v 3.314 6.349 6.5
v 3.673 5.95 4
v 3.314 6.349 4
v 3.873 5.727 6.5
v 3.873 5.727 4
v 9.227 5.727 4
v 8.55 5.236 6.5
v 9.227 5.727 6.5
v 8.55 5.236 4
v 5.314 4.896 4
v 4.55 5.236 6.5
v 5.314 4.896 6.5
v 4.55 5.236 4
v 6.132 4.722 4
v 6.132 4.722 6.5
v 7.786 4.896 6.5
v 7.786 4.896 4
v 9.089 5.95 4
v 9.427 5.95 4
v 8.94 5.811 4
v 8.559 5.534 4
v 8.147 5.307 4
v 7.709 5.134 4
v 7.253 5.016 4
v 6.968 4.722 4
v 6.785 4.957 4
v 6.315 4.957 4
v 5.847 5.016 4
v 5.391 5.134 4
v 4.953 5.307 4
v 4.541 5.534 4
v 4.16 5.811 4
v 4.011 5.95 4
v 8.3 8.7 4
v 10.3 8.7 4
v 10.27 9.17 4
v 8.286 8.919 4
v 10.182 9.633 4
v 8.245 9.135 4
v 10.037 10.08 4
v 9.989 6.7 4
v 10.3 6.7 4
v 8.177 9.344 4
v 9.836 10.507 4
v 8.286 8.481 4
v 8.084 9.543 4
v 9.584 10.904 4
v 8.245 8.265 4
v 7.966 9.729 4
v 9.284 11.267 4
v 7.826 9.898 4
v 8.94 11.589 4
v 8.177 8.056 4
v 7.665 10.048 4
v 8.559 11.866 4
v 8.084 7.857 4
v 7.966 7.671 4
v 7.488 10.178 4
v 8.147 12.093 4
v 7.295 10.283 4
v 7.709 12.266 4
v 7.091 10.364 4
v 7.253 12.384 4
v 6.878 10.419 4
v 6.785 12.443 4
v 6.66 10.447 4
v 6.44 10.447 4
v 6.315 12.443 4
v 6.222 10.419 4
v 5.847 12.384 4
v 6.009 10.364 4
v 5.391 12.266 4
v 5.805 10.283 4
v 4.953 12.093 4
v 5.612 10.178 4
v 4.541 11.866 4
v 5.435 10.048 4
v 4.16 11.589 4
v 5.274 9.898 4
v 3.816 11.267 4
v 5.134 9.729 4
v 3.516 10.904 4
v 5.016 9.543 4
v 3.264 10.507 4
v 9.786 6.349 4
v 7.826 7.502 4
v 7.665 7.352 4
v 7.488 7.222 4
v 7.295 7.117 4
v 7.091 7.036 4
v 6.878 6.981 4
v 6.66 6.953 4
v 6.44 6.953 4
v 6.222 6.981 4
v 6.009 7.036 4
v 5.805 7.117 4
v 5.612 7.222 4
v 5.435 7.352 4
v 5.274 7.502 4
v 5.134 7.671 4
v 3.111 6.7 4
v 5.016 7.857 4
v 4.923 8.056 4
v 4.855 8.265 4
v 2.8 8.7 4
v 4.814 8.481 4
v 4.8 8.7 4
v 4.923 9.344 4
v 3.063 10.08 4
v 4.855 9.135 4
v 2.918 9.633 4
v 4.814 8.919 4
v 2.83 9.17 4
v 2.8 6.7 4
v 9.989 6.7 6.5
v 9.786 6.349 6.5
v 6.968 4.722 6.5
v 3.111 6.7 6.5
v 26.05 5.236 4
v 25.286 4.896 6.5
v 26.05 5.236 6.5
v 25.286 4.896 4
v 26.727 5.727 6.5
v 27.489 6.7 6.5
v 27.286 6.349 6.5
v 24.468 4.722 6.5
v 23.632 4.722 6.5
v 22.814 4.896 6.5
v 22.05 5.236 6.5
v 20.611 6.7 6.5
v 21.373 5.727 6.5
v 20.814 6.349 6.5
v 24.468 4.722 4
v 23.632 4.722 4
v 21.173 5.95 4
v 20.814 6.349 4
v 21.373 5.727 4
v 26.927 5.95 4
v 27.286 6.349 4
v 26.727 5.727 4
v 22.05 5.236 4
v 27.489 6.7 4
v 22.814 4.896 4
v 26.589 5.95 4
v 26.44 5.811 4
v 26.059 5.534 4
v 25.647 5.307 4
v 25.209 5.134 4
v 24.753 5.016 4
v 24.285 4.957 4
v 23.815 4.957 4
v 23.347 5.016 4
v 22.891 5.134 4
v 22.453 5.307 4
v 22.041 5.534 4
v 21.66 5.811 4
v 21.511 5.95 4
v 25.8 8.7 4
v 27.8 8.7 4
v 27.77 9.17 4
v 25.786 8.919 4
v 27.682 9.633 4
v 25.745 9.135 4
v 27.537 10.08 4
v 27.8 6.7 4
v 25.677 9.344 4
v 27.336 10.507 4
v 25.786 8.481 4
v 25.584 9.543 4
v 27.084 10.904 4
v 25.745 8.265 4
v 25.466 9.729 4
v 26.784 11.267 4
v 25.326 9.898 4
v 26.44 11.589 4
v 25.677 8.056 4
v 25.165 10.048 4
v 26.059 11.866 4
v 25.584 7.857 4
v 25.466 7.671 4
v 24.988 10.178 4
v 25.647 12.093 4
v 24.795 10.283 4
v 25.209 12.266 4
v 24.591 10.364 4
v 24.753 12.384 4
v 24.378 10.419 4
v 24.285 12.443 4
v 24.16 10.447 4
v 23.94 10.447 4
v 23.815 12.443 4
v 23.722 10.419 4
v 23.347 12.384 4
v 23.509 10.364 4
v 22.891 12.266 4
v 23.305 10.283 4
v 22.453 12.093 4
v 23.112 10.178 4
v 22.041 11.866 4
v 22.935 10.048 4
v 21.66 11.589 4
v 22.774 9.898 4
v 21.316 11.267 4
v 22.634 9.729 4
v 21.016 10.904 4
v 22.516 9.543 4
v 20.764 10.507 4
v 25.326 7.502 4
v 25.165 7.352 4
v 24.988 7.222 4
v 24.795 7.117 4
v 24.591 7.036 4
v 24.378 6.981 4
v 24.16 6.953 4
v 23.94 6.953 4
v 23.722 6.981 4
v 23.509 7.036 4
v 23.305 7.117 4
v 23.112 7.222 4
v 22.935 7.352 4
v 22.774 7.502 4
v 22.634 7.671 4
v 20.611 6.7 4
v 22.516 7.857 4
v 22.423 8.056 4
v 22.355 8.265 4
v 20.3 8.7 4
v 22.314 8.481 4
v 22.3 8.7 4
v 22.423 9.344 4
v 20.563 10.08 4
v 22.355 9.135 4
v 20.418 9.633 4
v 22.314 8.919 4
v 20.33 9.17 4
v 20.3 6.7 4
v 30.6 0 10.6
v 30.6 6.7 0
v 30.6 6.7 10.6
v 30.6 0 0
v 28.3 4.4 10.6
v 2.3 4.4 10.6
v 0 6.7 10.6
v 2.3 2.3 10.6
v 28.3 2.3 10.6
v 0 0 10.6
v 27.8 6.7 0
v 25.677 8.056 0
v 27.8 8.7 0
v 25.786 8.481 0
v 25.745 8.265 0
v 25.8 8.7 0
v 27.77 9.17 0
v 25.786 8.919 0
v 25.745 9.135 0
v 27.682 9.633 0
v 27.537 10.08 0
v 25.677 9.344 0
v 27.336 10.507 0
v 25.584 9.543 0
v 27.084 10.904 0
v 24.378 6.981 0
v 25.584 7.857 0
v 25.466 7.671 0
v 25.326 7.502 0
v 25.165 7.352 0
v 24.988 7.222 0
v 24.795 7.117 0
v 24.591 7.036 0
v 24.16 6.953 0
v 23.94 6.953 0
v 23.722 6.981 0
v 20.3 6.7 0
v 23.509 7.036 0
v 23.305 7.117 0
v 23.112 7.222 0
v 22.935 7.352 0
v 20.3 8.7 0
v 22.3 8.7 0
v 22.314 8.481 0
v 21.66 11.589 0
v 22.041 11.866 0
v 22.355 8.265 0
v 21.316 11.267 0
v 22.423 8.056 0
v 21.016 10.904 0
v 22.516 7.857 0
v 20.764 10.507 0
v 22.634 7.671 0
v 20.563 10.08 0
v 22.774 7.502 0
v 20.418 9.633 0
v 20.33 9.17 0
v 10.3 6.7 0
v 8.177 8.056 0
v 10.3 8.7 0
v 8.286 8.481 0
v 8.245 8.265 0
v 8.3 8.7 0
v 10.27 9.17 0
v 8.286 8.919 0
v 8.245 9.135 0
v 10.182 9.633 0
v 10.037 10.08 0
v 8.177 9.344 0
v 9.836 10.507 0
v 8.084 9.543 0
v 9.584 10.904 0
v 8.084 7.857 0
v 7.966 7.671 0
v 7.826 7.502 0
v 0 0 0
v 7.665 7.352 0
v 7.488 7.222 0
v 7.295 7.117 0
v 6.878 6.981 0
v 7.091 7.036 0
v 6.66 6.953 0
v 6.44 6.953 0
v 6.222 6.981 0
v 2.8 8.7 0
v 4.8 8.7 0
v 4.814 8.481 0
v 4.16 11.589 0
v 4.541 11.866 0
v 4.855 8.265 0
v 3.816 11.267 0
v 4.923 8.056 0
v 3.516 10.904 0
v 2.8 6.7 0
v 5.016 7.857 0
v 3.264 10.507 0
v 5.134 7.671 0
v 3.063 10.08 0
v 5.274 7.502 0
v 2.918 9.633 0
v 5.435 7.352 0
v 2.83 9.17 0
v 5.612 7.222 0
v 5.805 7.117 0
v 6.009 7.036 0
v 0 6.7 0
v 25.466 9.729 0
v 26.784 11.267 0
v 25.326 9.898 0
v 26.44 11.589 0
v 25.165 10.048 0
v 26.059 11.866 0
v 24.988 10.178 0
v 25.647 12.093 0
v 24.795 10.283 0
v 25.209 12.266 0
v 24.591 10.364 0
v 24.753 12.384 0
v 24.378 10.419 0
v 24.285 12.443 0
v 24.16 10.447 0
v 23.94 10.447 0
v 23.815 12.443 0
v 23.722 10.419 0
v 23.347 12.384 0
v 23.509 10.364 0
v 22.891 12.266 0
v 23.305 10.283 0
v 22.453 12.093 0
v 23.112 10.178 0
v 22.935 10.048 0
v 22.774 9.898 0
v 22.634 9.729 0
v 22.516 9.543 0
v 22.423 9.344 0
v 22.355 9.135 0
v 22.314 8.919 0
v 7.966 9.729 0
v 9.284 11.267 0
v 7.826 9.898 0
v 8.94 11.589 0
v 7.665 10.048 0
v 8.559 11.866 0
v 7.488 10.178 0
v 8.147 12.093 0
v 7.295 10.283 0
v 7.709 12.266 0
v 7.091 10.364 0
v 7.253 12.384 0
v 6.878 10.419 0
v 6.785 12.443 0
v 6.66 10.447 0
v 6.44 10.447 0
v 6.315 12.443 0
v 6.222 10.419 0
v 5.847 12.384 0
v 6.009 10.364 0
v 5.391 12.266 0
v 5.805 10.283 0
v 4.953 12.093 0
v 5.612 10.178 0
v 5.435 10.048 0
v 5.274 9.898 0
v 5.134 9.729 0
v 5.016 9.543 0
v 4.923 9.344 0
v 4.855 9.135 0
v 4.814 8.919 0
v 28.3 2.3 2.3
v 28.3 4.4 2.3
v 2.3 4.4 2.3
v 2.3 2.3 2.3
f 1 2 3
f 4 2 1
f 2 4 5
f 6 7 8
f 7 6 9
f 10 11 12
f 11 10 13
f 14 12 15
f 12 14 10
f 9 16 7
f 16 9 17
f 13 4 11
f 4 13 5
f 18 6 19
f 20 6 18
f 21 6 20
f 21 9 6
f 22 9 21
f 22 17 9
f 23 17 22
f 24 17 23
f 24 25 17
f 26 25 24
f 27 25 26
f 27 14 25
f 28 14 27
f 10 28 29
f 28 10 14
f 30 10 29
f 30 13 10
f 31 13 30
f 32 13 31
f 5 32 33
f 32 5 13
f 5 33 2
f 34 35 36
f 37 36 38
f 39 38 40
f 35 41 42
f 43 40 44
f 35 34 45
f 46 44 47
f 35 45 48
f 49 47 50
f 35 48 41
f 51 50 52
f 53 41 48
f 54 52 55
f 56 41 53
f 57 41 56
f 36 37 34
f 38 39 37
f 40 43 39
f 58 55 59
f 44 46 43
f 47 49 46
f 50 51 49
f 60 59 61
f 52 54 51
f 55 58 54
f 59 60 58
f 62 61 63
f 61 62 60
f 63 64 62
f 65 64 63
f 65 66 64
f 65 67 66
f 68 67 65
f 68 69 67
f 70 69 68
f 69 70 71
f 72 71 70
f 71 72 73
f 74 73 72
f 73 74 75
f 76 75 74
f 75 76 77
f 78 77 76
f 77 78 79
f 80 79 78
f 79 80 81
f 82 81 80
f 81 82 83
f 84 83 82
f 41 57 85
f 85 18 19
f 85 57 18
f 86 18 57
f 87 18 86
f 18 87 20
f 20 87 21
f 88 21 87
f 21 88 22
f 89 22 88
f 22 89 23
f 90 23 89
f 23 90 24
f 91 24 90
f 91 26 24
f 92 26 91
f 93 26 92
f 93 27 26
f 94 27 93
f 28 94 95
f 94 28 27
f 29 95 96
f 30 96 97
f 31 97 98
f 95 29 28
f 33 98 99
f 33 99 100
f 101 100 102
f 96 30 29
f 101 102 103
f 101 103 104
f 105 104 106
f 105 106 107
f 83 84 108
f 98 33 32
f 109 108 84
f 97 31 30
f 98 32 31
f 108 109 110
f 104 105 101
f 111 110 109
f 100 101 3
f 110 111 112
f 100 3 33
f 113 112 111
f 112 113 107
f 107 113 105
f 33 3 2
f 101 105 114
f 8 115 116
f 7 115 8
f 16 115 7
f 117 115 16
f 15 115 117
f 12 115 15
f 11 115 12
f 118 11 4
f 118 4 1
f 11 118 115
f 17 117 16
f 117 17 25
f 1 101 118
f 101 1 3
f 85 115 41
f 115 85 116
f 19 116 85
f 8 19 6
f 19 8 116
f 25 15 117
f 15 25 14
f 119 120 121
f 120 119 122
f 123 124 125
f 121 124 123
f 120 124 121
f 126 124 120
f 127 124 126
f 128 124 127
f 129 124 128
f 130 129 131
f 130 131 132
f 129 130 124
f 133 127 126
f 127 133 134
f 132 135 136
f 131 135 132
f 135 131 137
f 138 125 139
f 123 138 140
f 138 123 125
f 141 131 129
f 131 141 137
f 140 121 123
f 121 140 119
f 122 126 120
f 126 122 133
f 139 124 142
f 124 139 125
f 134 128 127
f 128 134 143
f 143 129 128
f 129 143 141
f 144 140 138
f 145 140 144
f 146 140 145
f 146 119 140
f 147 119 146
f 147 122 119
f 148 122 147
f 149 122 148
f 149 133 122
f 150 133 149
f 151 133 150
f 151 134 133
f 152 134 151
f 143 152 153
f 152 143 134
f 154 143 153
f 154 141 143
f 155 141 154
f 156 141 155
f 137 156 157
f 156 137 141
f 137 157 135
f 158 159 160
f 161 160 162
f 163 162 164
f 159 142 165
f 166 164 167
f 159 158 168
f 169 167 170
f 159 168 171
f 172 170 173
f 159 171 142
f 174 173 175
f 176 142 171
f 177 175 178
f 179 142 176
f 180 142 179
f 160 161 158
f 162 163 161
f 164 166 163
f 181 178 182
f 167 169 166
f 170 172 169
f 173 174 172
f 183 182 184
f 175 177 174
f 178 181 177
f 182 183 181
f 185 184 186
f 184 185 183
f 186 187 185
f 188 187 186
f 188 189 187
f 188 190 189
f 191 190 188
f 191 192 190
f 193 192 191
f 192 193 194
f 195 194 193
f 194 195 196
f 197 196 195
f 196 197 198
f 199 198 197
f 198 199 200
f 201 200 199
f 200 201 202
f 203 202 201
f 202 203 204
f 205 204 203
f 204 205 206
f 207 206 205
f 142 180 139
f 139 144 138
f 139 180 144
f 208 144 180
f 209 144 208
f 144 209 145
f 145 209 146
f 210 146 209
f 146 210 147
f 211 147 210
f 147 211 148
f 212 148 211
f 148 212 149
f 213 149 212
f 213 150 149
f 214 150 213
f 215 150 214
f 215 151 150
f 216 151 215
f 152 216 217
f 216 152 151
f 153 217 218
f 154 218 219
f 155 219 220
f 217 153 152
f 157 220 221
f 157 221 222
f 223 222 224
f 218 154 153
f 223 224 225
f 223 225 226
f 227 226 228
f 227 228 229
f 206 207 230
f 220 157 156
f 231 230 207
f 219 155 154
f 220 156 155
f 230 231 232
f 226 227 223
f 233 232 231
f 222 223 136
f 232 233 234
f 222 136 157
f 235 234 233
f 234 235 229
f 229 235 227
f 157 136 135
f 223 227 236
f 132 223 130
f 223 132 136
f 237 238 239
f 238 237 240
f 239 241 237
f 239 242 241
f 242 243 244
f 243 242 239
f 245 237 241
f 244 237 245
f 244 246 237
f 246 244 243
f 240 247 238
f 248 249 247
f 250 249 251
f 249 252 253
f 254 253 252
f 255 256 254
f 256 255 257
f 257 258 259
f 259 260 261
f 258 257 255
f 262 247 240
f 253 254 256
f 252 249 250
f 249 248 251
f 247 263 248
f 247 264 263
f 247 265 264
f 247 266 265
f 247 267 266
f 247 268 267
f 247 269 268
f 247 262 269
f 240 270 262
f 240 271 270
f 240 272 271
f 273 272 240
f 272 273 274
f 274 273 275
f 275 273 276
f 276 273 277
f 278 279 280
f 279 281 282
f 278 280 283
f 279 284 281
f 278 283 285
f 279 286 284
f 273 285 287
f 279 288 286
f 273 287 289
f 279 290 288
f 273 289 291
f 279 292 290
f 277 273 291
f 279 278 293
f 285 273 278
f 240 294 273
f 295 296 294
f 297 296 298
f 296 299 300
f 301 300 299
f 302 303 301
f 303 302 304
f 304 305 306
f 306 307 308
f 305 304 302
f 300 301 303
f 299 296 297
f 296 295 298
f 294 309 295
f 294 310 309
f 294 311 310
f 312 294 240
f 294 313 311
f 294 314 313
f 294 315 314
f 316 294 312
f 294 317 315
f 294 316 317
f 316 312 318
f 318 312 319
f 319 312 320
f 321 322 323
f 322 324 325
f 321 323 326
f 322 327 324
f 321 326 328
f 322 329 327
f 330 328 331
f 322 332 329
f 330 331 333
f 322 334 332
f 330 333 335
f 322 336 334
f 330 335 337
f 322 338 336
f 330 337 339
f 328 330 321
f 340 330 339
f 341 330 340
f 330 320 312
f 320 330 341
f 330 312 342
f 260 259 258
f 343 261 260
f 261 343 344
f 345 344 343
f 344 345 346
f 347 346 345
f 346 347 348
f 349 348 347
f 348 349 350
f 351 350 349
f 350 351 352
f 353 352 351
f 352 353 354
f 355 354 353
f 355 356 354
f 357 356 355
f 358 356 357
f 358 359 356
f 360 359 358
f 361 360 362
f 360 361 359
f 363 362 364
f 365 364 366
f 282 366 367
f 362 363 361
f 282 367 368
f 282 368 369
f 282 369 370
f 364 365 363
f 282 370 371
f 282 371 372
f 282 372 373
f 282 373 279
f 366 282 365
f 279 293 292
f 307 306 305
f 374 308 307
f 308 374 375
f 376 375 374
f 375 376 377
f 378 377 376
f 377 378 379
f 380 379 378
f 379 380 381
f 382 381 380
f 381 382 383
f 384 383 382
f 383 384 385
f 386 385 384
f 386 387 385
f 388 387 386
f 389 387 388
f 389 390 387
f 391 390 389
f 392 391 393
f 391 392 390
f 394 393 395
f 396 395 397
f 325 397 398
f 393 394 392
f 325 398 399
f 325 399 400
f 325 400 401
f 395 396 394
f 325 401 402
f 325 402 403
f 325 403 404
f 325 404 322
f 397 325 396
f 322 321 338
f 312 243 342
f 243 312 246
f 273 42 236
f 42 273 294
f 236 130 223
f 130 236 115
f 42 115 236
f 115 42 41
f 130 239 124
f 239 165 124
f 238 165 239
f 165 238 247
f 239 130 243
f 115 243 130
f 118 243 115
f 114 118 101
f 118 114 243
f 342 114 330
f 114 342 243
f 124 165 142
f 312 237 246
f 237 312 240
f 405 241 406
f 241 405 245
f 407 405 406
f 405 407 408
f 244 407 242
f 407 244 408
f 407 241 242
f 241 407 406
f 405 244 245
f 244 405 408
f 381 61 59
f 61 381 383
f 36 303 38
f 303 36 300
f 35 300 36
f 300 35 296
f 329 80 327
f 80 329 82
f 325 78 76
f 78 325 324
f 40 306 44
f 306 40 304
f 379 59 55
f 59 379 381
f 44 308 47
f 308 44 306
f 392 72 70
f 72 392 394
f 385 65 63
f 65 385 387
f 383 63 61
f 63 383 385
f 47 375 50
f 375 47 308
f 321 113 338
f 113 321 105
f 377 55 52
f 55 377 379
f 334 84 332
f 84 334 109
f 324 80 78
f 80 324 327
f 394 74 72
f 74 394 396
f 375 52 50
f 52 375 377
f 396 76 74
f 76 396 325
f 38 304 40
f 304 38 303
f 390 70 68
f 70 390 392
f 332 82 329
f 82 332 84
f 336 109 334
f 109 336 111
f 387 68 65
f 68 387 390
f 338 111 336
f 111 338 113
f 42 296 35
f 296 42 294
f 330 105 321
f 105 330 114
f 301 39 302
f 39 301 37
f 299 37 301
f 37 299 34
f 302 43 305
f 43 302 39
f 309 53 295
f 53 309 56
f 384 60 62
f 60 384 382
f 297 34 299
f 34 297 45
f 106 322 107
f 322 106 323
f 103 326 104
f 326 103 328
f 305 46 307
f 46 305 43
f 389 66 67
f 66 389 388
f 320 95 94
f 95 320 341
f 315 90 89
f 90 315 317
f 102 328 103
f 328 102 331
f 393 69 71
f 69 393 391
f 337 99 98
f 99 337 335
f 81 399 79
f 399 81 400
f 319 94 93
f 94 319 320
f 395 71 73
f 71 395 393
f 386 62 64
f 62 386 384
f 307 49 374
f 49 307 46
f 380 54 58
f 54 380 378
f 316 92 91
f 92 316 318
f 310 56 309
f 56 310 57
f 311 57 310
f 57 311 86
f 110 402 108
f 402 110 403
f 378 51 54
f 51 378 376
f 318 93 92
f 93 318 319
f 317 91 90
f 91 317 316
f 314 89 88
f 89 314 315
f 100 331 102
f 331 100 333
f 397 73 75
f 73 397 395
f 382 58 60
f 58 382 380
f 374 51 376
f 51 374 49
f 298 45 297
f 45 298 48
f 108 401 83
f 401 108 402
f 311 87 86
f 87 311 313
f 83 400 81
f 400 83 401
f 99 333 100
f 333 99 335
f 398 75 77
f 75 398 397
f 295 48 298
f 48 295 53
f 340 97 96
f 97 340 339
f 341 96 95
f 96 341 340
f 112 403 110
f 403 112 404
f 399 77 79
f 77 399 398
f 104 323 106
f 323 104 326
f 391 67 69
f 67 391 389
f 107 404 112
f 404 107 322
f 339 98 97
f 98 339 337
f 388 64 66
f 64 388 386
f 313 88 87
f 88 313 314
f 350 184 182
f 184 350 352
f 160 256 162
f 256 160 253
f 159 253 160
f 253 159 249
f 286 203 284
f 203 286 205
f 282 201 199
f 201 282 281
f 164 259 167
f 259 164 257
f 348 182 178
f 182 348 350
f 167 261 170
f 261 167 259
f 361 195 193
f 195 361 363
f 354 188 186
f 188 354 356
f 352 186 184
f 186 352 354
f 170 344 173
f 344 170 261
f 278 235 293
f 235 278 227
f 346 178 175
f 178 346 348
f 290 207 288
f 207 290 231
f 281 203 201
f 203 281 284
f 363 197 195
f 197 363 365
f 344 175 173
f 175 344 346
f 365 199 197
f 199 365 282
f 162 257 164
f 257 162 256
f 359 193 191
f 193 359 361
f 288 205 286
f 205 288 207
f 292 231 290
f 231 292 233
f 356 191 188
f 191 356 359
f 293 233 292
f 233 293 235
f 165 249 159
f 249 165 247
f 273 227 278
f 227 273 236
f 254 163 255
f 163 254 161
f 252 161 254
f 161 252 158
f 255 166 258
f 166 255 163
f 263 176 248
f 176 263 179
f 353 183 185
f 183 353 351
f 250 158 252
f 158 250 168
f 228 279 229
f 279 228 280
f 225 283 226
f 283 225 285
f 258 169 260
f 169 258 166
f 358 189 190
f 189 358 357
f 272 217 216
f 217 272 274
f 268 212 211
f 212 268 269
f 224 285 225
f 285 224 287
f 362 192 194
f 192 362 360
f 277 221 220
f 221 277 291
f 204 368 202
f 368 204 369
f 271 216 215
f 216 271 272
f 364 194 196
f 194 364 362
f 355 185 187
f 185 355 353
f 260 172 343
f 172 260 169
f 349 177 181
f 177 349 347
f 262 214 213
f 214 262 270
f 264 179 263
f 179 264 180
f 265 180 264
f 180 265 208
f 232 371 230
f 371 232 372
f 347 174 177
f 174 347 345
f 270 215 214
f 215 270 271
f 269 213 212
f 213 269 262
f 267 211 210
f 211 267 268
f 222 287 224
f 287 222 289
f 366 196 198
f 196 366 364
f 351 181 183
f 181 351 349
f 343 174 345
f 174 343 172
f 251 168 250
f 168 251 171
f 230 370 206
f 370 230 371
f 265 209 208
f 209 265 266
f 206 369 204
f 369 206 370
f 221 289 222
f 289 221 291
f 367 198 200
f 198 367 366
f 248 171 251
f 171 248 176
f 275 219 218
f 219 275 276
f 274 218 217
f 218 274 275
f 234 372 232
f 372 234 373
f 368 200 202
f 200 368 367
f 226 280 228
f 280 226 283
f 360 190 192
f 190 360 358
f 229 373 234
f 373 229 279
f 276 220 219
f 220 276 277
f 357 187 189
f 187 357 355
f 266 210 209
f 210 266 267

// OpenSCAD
screw_dst = 17.5;

module base() {
    th = 2;
    pad = 0.3;
    thcube = [1,1,1]*(th+pad);
    size = [26,2.1,6];
    
    
    screw_h = size[2]-2;
    screw_pos = [(2*(th+pad)+size[0]-screw_dst)/2,(th+pad)*2+2.1+2,0];
    
    difference() {
        cube(size+thcube*2);

        translate(thcube)
        cube(size+[0,0,10]);
        
        translate([0,0,screw_h]+screw_pos) {
            h=2.5;
            cylinder(r=4, h=h, $fn=30);
            translate([screw_dst,0,0]) cylinder(r=4, h=h, $fn=30);
        }
    }
    
    // screws
    module screws() {
        module s(h=screw_h) {
            $fn=50;
            r = 3.5/2;
            difference() {
                union() {
                    cylinder(r=r+2, h=h);
                    translate(-[r+2,r+1,0])
                    cube([(r+2)*2,r+1,h]);
                }
                cylinder(r=r, h=h);
            }
        }
        
        translate(screw_pos) {
            translate([screw_dst,0,0]) s();
            s();
        }
    }
    
    screws();
}


base();

module holder() {
    
    
}


holder();
